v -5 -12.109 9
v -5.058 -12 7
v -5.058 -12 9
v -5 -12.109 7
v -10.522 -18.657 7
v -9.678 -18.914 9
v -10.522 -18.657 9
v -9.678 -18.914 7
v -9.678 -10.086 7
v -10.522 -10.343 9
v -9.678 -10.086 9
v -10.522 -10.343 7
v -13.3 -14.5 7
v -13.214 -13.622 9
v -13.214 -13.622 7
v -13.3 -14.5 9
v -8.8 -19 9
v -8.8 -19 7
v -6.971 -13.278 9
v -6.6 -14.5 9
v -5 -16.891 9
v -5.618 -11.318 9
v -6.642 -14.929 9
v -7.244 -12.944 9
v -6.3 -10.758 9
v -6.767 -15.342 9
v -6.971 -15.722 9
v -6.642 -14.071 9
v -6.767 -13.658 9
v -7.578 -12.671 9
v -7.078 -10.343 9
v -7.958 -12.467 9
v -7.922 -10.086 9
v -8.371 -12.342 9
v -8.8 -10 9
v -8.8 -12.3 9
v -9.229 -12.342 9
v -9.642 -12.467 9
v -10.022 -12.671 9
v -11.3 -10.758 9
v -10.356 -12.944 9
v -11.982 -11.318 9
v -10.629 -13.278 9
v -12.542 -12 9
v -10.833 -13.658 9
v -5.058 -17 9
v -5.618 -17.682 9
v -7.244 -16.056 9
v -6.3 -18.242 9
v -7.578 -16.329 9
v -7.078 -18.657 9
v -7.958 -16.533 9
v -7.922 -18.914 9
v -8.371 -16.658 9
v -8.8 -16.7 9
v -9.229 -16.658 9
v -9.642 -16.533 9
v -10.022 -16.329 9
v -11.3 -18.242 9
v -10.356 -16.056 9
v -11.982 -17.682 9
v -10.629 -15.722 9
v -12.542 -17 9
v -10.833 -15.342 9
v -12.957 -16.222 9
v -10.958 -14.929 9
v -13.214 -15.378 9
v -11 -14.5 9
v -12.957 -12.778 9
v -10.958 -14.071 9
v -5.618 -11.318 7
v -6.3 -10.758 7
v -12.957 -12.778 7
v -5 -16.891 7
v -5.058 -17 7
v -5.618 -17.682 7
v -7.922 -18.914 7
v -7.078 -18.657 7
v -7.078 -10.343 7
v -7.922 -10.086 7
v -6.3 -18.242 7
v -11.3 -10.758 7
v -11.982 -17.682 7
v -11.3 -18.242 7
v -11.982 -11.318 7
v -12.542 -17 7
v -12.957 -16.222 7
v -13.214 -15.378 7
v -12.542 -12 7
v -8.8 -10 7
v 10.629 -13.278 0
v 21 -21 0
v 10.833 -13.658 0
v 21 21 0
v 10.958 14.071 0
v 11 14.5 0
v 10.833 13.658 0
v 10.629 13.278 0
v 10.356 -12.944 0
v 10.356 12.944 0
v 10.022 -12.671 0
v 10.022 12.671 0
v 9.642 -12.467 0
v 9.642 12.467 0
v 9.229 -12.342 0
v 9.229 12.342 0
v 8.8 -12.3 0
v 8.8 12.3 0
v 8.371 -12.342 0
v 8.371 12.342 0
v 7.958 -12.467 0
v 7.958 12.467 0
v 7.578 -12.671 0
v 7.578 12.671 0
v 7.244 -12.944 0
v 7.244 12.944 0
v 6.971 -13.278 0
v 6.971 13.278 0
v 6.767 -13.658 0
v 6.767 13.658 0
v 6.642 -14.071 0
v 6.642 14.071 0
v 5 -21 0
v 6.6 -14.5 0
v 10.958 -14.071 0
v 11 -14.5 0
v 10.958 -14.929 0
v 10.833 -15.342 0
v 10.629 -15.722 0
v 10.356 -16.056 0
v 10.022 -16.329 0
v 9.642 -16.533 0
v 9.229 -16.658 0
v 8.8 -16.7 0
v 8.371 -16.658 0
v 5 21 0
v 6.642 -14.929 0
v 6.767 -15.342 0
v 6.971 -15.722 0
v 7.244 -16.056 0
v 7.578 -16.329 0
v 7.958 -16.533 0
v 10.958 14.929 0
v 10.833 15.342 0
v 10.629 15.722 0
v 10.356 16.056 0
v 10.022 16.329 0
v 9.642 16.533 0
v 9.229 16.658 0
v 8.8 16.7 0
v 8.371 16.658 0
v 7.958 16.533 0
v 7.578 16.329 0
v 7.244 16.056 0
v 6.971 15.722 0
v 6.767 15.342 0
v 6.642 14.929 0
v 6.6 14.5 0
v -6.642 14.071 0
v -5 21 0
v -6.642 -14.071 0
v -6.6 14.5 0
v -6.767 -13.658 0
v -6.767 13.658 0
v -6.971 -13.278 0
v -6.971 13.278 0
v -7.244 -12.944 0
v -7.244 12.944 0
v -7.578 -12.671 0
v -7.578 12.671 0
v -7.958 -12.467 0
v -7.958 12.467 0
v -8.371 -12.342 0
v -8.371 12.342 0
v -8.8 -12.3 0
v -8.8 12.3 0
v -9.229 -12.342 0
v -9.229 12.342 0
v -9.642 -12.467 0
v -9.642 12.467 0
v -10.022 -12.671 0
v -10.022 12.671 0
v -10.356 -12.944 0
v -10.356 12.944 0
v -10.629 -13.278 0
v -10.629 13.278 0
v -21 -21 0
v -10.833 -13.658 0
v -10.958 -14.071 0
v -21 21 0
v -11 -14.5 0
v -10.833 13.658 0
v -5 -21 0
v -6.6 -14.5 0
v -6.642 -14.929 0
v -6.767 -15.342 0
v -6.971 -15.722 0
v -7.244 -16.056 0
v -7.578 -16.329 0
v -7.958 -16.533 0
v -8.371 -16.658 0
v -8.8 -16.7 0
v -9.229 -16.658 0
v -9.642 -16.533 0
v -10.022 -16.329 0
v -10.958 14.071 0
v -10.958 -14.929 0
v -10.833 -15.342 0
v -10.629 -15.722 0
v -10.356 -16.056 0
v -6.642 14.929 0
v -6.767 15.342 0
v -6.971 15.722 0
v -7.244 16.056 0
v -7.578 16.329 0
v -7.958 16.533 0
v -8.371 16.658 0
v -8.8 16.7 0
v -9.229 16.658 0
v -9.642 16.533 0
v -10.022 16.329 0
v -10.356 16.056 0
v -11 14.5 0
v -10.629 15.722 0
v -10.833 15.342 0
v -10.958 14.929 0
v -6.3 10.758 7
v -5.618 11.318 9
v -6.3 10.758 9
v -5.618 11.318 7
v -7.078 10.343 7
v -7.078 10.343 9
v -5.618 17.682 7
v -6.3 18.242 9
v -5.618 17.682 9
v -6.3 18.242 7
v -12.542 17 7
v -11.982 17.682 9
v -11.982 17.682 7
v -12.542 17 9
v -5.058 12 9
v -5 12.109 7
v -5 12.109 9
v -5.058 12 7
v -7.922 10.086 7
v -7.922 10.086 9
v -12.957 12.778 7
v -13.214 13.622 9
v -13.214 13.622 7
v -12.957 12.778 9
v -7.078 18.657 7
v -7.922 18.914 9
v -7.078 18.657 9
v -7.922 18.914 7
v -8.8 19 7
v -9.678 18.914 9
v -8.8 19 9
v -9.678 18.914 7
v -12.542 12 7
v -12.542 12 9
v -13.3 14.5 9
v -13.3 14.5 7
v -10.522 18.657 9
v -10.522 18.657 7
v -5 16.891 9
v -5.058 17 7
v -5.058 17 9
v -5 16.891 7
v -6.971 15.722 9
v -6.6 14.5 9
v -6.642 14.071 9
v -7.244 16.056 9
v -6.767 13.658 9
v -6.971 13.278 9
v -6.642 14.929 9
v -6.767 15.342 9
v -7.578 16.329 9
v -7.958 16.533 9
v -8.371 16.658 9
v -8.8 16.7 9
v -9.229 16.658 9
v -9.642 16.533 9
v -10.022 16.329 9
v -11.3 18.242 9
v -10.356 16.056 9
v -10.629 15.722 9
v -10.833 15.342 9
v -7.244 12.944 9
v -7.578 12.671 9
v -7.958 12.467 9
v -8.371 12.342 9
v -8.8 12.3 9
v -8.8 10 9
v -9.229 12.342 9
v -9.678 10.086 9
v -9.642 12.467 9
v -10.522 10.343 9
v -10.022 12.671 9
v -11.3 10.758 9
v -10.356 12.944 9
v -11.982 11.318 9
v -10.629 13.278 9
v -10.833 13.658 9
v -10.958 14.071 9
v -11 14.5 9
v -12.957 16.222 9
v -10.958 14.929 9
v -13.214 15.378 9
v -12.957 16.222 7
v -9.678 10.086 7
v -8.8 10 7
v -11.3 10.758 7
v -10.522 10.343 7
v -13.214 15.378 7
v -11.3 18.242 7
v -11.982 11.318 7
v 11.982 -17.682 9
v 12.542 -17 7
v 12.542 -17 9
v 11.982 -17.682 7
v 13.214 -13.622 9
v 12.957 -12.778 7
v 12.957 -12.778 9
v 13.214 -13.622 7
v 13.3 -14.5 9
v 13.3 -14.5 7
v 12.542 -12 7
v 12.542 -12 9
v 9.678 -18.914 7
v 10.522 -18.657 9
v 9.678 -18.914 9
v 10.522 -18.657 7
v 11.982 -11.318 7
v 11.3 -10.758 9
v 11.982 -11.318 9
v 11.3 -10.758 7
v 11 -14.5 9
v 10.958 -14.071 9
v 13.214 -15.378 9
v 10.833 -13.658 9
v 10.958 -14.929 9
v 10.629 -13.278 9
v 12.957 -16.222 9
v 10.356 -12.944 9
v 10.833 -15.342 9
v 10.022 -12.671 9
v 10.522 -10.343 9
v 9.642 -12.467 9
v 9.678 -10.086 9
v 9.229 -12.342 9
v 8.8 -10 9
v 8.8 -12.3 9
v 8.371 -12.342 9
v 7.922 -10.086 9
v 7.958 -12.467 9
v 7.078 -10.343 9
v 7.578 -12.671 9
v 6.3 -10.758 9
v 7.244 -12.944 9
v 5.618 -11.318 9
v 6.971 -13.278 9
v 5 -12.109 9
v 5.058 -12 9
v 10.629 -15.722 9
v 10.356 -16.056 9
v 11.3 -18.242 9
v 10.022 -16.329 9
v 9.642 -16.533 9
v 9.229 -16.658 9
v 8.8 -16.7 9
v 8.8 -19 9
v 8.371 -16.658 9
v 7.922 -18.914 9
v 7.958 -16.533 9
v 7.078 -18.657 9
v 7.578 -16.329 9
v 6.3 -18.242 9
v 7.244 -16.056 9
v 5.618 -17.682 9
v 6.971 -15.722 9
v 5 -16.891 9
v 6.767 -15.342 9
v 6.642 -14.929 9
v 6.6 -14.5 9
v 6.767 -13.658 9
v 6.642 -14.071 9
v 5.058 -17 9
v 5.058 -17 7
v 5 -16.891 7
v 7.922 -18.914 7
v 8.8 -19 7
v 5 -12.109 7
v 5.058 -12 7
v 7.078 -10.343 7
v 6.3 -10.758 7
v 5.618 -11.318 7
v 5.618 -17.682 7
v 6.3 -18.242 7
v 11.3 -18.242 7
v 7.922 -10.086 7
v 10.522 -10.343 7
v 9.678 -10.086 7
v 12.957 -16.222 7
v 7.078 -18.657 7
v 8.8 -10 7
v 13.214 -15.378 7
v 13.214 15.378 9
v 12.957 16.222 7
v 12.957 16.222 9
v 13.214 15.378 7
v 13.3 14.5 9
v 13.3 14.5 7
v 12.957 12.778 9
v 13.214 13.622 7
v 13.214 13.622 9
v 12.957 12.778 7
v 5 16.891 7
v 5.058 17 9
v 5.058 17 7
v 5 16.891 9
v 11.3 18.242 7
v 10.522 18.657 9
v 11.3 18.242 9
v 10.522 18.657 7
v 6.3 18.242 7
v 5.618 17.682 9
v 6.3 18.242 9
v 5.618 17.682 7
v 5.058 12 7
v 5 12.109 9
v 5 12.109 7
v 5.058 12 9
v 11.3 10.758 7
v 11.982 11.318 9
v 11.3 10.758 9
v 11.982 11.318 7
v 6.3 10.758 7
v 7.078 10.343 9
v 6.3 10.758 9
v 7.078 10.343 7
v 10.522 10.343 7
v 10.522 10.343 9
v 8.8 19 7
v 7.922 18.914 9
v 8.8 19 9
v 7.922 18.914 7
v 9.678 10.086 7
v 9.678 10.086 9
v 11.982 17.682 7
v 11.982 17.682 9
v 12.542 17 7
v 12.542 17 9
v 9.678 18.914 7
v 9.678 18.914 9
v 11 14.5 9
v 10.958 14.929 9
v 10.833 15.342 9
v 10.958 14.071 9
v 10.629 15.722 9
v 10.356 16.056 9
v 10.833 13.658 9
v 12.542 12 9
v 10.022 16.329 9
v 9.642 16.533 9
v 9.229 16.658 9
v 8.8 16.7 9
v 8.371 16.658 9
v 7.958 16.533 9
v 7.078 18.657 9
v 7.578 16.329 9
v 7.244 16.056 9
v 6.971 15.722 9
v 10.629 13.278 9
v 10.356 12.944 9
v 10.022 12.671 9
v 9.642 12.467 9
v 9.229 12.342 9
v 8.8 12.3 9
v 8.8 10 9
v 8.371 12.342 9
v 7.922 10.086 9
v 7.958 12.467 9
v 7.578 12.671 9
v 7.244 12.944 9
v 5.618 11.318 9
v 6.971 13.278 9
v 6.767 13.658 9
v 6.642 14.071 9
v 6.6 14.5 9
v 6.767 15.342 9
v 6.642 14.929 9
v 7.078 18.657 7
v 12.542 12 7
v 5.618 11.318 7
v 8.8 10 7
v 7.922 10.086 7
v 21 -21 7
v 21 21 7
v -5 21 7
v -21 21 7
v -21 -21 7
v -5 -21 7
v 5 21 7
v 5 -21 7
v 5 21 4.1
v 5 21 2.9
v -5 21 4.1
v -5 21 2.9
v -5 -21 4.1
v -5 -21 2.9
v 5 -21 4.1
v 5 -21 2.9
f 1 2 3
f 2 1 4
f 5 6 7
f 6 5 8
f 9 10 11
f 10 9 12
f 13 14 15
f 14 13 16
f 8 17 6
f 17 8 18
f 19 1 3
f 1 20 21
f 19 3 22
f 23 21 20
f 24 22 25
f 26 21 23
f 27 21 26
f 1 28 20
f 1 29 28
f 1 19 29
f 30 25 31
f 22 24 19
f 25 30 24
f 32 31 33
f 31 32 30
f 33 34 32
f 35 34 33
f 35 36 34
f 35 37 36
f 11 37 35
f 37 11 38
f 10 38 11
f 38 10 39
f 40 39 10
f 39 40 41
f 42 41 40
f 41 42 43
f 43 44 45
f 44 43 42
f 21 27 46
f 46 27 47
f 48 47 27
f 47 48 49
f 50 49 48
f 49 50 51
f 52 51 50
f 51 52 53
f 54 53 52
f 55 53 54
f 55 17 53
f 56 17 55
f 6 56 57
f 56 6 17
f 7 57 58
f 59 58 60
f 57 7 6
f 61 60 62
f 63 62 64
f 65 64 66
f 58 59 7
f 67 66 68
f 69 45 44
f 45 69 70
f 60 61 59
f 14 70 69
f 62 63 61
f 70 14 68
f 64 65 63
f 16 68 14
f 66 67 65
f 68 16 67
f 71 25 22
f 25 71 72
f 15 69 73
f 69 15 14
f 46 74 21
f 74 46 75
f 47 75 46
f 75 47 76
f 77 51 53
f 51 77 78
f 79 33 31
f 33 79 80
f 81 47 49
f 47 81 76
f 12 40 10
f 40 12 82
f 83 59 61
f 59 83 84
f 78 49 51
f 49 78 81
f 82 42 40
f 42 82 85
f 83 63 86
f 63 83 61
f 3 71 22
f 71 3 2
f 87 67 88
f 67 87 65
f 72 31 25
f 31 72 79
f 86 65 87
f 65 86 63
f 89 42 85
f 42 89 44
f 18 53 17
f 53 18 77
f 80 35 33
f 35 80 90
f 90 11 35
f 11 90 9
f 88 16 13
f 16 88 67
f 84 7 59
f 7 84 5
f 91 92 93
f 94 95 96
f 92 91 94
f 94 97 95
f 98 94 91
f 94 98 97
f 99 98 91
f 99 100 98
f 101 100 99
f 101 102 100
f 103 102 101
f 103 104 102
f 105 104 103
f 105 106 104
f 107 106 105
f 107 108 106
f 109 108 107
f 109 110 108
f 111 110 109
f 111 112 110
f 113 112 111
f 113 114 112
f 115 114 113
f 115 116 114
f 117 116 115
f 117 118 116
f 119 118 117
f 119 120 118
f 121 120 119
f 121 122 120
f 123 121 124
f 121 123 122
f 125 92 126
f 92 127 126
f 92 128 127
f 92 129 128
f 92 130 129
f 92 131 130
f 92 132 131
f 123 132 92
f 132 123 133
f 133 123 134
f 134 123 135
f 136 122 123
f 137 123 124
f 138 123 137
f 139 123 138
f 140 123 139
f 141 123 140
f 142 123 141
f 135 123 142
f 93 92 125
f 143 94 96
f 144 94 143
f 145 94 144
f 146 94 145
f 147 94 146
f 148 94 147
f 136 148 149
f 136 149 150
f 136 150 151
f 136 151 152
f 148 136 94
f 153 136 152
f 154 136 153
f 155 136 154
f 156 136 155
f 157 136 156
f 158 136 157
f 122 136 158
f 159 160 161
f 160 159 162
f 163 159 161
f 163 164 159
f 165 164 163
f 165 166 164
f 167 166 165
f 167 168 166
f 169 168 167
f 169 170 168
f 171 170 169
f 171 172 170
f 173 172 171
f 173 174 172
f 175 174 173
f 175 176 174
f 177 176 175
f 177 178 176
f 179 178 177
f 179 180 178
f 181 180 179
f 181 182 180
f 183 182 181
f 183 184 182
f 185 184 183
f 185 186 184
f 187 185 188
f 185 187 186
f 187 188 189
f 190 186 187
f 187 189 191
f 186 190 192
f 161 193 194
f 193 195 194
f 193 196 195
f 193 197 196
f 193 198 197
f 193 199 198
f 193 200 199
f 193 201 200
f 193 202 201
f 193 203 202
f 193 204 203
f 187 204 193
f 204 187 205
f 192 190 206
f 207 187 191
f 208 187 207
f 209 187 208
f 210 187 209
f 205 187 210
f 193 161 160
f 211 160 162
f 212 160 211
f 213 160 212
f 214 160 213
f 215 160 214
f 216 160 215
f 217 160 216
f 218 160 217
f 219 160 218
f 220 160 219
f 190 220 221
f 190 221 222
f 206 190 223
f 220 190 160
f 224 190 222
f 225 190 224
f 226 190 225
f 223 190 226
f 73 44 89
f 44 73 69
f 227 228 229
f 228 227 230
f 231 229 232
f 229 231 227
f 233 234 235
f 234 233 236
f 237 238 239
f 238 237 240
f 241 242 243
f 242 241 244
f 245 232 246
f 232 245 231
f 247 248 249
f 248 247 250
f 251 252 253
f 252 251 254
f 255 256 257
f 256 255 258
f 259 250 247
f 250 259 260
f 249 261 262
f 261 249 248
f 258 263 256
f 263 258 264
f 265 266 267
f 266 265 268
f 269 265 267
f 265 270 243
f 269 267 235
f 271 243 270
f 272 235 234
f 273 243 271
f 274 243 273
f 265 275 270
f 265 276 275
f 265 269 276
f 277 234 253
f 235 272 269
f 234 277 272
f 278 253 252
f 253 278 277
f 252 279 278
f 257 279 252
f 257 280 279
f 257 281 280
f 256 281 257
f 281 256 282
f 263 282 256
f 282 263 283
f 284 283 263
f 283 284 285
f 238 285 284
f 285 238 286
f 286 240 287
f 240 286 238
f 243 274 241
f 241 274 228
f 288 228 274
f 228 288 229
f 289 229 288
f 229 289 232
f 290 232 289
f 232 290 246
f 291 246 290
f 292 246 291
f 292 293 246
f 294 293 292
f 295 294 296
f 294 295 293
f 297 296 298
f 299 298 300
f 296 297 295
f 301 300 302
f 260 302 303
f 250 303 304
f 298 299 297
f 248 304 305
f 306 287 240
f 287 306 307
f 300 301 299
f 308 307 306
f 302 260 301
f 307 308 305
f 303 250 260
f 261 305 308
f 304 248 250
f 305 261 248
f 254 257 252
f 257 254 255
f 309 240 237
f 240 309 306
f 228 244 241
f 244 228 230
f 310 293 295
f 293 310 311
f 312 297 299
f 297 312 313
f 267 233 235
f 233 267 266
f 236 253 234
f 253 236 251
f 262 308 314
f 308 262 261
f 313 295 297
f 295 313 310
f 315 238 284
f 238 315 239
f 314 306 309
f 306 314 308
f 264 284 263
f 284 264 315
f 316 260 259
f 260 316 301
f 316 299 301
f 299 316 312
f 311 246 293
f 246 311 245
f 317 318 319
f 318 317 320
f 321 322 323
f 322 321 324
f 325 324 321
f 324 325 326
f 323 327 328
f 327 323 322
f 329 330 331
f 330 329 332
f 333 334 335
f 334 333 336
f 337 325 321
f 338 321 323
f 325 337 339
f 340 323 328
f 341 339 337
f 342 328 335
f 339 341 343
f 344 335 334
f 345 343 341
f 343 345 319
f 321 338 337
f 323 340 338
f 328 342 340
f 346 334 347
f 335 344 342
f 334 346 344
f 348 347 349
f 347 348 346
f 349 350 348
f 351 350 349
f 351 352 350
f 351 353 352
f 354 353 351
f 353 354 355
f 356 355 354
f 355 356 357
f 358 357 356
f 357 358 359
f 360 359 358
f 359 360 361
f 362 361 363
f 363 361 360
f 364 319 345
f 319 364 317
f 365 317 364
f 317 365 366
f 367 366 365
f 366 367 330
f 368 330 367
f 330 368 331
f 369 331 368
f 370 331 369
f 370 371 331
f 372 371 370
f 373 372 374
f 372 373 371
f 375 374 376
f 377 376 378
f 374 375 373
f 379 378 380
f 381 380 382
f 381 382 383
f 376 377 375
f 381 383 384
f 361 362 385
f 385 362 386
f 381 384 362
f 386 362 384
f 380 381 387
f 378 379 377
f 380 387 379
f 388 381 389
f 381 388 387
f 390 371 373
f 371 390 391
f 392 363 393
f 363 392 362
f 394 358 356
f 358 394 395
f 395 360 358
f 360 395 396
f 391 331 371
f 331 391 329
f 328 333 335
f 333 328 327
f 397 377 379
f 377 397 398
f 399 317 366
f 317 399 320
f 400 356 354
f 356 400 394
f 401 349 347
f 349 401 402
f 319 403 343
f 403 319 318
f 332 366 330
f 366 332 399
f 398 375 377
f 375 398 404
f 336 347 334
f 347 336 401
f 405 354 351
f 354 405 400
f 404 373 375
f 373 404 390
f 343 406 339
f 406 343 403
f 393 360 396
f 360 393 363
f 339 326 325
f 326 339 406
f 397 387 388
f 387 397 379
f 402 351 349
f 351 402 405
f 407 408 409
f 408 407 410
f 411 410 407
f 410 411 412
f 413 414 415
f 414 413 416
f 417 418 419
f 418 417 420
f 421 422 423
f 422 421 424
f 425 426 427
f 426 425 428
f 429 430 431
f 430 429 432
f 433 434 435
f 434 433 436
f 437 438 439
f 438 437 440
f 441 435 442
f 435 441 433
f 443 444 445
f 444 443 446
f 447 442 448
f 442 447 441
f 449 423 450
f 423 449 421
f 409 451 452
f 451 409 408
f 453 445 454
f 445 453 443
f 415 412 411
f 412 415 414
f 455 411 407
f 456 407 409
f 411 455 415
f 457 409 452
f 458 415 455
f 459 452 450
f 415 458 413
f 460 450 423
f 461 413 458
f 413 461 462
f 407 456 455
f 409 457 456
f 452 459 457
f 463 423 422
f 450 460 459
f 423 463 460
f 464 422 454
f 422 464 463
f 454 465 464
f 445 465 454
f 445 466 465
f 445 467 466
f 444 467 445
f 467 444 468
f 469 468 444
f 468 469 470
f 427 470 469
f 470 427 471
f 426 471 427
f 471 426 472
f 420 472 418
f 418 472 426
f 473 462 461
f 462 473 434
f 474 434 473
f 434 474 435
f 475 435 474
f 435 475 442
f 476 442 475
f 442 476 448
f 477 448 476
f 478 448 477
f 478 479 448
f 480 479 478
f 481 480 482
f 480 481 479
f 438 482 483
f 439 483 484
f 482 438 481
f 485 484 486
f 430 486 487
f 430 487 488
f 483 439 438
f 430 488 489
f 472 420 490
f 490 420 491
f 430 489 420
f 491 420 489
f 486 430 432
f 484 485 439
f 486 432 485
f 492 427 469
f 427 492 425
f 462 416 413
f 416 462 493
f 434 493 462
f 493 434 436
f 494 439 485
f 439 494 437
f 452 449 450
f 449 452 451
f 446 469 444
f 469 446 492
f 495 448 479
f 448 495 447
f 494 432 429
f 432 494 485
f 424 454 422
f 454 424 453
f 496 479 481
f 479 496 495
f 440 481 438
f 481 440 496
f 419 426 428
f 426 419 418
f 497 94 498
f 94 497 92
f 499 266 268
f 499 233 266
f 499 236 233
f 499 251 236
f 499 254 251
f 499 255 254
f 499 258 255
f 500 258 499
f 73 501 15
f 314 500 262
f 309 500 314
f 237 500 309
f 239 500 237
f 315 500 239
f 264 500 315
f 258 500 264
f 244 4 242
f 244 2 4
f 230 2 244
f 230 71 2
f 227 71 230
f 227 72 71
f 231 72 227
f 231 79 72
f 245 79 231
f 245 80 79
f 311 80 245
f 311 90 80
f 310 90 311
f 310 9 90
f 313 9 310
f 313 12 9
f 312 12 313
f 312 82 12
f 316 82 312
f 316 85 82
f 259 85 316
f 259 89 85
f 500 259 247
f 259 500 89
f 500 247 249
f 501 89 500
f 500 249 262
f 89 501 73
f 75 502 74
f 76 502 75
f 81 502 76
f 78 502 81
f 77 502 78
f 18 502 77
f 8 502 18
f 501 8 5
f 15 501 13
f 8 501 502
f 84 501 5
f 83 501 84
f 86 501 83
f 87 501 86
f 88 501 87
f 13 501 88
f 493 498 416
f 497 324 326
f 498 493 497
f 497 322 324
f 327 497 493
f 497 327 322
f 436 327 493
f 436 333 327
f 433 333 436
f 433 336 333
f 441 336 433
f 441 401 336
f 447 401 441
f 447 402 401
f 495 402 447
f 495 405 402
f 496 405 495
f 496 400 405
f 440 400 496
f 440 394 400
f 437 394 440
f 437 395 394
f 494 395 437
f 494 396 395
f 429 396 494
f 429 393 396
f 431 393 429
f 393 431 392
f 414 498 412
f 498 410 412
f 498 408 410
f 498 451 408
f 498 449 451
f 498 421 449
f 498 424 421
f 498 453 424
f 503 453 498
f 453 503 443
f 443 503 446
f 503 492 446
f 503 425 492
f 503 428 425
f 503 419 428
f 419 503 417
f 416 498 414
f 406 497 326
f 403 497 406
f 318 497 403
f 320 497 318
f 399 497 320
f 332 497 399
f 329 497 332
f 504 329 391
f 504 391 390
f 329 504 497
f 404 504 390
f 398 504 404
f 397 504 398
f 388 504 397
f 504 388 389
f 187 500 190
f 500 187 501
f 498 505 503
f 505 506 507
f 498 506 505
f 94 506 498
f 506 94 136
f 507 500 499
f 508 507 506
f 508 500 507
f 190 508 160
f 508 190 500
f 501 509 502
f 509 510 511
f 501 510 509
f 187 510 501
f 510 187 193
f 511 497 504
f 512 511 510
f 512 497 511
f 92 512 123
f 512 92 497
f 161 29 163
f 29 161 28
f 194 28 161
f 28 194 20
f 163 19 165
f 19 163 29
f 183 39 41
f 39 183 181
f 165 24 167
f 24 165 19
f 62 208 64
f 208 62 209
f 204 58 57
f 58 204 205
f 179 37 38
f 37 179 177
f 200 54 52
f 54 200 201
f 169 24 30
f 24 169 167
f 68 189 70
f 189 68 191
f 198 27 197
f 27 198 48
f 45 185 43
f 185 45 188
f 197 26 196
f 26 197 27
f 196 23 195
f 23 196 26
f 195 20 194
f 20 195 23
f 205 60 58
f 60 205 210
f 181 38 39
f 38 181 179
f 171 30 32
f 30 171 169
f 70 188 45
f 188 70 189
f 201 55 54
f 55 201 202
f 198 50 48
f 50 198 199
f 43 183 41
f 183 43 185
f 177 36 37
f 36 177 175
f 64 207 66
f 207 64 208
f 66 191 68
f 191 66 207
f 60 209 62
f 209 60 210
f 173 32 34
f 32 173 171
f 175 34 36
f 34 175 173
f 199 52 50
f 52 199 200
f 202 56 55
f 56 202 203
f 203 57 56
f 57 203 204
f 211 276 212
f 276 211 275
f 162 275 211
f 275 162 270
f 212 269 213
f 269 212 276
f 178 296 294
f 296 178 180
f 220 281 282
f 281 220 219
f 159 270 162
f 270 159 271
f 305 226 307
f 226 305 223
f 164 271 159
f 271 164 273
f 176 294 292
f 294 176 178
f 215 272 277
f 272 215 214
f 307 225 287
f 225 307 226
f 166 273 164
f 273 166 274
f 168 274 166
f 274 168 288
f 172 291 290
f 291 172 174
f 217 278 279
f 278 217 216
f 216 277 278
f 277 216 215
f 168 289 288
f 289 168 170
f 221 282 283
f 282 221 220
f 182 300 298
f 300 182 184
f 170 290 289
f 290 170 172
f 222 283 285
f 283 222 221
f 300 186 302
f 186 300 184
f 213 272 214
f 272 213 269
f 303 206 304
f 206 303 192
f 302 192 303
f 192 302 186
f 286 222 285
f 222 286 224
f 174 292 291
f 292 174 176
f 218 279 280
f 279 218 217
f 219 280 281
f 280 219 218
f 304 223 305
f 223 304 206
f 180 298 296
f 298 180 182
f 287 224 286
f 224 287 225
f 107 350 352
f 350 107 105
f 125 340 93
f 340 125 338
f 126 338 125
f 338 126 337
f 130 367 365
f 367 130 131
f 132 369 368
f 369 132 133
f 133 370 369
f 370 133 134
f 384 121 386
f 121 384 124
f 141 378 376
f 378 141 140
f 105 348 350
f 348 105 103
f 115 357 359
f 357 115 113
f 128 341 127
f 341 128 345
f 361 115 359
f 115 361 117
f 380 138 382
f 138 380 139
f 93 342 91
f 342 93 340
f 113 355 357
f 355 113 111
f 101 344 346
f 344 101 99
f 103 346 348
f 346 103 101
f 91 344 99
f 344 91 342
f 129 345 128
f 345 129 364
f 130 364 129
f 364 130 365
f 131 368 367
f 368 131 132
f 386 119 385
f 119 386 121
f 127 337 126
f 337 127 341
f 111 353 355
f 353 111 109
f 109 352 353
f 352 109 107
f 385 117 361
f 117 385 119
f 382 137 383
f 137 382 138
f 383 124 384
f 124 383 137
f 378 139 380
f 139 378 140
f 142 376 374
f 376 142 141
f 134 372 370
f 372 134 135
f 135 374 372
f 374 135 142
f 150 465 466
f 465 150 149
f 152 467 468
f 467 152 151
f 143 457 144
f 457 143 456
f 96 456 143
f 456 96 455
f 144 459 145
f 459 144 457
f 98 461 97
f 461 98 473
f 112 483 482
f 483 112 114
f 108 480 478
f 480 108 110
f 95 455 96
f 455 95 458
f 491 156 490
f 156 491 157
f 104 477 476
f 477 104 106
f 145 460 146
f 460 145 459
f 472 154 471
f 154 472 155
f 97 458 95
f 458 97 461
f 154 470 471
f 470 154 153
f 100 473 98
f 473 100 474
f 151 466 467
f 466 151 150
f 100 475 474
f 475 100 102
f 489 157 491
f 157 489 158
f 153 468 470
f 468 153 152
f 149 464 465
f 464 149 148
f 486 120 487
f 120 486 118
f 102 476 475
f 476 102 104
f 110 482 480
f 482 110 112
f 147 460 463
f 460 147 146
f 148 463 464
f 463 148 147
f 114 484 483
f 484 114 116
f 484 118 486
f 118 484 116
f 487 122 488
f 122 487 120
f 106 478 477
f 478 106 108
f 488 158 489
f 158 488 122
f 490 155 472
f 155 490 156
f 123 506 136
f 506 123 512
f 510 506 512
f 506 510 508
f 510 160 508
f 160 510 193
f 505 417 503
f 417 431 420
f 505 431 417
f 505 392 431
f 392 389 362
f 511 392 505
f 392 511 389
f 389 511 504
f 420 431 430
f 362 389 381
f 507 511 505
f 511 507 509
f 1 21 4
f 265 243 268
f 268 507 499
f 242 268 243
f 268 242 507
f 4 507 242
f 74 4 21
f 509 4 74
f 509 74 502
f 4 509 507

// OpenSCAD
$fn = 32;

// ----------------------------------------------------------------------
// Living hinge: 42 x 42 mm plates, 1.2 mm flexible web
// ----------------------------------------------------------------------

// --- parameters (mm) ---
plate_len = 16;           // plate length outside the web
plate_w = 42;             // plate width
thick = 7;                // plate thickness
web_half = 5;             // half width of the flex band
web_t = 1.2;              // flexible web thickness
web_z = 2.9;              // web position inside the thickness
boss_d = 9;               // screw boss diameter
boss_h = 9;               // screw boss height
boss_x = 8.8;             // screw boss distance from the web
screw_d = 4.4;            // screw hole

difference() {
  union() {
    /* one flat strip, later thinned at the middle */
    translate([-21, -21, 0]) cube([42, 42, 7]);
    /* screw bosses, sunk 0.5 mm into the plates */
    for (sx = [-8.8, 8.8]) {
      for (sy = [-14.5, 14.5]) {
        translate([sx, sy, 0]) cylinder(h = boss_h, d = boss_d);
      }
    }
  }
  /* channel from below: leaves the web on top of it */
  translate([-5, -23.5, -2.5]) cube([10, 47, 5.4]);
  /* channel from above: thins the web down to web_t */
  translate([-5, -23.5, 4.1]) cube([10, 47, 5.4]);
  /* screw holes through the bosses */
  for (sx = [-8.8, 8.8]) {
    for (sy = [-14.5, 14.5]) {
      translate([sx, sy, -2.5]) cylinder(h = boss_h + 5, d = screw_d);
    }
  }
}
